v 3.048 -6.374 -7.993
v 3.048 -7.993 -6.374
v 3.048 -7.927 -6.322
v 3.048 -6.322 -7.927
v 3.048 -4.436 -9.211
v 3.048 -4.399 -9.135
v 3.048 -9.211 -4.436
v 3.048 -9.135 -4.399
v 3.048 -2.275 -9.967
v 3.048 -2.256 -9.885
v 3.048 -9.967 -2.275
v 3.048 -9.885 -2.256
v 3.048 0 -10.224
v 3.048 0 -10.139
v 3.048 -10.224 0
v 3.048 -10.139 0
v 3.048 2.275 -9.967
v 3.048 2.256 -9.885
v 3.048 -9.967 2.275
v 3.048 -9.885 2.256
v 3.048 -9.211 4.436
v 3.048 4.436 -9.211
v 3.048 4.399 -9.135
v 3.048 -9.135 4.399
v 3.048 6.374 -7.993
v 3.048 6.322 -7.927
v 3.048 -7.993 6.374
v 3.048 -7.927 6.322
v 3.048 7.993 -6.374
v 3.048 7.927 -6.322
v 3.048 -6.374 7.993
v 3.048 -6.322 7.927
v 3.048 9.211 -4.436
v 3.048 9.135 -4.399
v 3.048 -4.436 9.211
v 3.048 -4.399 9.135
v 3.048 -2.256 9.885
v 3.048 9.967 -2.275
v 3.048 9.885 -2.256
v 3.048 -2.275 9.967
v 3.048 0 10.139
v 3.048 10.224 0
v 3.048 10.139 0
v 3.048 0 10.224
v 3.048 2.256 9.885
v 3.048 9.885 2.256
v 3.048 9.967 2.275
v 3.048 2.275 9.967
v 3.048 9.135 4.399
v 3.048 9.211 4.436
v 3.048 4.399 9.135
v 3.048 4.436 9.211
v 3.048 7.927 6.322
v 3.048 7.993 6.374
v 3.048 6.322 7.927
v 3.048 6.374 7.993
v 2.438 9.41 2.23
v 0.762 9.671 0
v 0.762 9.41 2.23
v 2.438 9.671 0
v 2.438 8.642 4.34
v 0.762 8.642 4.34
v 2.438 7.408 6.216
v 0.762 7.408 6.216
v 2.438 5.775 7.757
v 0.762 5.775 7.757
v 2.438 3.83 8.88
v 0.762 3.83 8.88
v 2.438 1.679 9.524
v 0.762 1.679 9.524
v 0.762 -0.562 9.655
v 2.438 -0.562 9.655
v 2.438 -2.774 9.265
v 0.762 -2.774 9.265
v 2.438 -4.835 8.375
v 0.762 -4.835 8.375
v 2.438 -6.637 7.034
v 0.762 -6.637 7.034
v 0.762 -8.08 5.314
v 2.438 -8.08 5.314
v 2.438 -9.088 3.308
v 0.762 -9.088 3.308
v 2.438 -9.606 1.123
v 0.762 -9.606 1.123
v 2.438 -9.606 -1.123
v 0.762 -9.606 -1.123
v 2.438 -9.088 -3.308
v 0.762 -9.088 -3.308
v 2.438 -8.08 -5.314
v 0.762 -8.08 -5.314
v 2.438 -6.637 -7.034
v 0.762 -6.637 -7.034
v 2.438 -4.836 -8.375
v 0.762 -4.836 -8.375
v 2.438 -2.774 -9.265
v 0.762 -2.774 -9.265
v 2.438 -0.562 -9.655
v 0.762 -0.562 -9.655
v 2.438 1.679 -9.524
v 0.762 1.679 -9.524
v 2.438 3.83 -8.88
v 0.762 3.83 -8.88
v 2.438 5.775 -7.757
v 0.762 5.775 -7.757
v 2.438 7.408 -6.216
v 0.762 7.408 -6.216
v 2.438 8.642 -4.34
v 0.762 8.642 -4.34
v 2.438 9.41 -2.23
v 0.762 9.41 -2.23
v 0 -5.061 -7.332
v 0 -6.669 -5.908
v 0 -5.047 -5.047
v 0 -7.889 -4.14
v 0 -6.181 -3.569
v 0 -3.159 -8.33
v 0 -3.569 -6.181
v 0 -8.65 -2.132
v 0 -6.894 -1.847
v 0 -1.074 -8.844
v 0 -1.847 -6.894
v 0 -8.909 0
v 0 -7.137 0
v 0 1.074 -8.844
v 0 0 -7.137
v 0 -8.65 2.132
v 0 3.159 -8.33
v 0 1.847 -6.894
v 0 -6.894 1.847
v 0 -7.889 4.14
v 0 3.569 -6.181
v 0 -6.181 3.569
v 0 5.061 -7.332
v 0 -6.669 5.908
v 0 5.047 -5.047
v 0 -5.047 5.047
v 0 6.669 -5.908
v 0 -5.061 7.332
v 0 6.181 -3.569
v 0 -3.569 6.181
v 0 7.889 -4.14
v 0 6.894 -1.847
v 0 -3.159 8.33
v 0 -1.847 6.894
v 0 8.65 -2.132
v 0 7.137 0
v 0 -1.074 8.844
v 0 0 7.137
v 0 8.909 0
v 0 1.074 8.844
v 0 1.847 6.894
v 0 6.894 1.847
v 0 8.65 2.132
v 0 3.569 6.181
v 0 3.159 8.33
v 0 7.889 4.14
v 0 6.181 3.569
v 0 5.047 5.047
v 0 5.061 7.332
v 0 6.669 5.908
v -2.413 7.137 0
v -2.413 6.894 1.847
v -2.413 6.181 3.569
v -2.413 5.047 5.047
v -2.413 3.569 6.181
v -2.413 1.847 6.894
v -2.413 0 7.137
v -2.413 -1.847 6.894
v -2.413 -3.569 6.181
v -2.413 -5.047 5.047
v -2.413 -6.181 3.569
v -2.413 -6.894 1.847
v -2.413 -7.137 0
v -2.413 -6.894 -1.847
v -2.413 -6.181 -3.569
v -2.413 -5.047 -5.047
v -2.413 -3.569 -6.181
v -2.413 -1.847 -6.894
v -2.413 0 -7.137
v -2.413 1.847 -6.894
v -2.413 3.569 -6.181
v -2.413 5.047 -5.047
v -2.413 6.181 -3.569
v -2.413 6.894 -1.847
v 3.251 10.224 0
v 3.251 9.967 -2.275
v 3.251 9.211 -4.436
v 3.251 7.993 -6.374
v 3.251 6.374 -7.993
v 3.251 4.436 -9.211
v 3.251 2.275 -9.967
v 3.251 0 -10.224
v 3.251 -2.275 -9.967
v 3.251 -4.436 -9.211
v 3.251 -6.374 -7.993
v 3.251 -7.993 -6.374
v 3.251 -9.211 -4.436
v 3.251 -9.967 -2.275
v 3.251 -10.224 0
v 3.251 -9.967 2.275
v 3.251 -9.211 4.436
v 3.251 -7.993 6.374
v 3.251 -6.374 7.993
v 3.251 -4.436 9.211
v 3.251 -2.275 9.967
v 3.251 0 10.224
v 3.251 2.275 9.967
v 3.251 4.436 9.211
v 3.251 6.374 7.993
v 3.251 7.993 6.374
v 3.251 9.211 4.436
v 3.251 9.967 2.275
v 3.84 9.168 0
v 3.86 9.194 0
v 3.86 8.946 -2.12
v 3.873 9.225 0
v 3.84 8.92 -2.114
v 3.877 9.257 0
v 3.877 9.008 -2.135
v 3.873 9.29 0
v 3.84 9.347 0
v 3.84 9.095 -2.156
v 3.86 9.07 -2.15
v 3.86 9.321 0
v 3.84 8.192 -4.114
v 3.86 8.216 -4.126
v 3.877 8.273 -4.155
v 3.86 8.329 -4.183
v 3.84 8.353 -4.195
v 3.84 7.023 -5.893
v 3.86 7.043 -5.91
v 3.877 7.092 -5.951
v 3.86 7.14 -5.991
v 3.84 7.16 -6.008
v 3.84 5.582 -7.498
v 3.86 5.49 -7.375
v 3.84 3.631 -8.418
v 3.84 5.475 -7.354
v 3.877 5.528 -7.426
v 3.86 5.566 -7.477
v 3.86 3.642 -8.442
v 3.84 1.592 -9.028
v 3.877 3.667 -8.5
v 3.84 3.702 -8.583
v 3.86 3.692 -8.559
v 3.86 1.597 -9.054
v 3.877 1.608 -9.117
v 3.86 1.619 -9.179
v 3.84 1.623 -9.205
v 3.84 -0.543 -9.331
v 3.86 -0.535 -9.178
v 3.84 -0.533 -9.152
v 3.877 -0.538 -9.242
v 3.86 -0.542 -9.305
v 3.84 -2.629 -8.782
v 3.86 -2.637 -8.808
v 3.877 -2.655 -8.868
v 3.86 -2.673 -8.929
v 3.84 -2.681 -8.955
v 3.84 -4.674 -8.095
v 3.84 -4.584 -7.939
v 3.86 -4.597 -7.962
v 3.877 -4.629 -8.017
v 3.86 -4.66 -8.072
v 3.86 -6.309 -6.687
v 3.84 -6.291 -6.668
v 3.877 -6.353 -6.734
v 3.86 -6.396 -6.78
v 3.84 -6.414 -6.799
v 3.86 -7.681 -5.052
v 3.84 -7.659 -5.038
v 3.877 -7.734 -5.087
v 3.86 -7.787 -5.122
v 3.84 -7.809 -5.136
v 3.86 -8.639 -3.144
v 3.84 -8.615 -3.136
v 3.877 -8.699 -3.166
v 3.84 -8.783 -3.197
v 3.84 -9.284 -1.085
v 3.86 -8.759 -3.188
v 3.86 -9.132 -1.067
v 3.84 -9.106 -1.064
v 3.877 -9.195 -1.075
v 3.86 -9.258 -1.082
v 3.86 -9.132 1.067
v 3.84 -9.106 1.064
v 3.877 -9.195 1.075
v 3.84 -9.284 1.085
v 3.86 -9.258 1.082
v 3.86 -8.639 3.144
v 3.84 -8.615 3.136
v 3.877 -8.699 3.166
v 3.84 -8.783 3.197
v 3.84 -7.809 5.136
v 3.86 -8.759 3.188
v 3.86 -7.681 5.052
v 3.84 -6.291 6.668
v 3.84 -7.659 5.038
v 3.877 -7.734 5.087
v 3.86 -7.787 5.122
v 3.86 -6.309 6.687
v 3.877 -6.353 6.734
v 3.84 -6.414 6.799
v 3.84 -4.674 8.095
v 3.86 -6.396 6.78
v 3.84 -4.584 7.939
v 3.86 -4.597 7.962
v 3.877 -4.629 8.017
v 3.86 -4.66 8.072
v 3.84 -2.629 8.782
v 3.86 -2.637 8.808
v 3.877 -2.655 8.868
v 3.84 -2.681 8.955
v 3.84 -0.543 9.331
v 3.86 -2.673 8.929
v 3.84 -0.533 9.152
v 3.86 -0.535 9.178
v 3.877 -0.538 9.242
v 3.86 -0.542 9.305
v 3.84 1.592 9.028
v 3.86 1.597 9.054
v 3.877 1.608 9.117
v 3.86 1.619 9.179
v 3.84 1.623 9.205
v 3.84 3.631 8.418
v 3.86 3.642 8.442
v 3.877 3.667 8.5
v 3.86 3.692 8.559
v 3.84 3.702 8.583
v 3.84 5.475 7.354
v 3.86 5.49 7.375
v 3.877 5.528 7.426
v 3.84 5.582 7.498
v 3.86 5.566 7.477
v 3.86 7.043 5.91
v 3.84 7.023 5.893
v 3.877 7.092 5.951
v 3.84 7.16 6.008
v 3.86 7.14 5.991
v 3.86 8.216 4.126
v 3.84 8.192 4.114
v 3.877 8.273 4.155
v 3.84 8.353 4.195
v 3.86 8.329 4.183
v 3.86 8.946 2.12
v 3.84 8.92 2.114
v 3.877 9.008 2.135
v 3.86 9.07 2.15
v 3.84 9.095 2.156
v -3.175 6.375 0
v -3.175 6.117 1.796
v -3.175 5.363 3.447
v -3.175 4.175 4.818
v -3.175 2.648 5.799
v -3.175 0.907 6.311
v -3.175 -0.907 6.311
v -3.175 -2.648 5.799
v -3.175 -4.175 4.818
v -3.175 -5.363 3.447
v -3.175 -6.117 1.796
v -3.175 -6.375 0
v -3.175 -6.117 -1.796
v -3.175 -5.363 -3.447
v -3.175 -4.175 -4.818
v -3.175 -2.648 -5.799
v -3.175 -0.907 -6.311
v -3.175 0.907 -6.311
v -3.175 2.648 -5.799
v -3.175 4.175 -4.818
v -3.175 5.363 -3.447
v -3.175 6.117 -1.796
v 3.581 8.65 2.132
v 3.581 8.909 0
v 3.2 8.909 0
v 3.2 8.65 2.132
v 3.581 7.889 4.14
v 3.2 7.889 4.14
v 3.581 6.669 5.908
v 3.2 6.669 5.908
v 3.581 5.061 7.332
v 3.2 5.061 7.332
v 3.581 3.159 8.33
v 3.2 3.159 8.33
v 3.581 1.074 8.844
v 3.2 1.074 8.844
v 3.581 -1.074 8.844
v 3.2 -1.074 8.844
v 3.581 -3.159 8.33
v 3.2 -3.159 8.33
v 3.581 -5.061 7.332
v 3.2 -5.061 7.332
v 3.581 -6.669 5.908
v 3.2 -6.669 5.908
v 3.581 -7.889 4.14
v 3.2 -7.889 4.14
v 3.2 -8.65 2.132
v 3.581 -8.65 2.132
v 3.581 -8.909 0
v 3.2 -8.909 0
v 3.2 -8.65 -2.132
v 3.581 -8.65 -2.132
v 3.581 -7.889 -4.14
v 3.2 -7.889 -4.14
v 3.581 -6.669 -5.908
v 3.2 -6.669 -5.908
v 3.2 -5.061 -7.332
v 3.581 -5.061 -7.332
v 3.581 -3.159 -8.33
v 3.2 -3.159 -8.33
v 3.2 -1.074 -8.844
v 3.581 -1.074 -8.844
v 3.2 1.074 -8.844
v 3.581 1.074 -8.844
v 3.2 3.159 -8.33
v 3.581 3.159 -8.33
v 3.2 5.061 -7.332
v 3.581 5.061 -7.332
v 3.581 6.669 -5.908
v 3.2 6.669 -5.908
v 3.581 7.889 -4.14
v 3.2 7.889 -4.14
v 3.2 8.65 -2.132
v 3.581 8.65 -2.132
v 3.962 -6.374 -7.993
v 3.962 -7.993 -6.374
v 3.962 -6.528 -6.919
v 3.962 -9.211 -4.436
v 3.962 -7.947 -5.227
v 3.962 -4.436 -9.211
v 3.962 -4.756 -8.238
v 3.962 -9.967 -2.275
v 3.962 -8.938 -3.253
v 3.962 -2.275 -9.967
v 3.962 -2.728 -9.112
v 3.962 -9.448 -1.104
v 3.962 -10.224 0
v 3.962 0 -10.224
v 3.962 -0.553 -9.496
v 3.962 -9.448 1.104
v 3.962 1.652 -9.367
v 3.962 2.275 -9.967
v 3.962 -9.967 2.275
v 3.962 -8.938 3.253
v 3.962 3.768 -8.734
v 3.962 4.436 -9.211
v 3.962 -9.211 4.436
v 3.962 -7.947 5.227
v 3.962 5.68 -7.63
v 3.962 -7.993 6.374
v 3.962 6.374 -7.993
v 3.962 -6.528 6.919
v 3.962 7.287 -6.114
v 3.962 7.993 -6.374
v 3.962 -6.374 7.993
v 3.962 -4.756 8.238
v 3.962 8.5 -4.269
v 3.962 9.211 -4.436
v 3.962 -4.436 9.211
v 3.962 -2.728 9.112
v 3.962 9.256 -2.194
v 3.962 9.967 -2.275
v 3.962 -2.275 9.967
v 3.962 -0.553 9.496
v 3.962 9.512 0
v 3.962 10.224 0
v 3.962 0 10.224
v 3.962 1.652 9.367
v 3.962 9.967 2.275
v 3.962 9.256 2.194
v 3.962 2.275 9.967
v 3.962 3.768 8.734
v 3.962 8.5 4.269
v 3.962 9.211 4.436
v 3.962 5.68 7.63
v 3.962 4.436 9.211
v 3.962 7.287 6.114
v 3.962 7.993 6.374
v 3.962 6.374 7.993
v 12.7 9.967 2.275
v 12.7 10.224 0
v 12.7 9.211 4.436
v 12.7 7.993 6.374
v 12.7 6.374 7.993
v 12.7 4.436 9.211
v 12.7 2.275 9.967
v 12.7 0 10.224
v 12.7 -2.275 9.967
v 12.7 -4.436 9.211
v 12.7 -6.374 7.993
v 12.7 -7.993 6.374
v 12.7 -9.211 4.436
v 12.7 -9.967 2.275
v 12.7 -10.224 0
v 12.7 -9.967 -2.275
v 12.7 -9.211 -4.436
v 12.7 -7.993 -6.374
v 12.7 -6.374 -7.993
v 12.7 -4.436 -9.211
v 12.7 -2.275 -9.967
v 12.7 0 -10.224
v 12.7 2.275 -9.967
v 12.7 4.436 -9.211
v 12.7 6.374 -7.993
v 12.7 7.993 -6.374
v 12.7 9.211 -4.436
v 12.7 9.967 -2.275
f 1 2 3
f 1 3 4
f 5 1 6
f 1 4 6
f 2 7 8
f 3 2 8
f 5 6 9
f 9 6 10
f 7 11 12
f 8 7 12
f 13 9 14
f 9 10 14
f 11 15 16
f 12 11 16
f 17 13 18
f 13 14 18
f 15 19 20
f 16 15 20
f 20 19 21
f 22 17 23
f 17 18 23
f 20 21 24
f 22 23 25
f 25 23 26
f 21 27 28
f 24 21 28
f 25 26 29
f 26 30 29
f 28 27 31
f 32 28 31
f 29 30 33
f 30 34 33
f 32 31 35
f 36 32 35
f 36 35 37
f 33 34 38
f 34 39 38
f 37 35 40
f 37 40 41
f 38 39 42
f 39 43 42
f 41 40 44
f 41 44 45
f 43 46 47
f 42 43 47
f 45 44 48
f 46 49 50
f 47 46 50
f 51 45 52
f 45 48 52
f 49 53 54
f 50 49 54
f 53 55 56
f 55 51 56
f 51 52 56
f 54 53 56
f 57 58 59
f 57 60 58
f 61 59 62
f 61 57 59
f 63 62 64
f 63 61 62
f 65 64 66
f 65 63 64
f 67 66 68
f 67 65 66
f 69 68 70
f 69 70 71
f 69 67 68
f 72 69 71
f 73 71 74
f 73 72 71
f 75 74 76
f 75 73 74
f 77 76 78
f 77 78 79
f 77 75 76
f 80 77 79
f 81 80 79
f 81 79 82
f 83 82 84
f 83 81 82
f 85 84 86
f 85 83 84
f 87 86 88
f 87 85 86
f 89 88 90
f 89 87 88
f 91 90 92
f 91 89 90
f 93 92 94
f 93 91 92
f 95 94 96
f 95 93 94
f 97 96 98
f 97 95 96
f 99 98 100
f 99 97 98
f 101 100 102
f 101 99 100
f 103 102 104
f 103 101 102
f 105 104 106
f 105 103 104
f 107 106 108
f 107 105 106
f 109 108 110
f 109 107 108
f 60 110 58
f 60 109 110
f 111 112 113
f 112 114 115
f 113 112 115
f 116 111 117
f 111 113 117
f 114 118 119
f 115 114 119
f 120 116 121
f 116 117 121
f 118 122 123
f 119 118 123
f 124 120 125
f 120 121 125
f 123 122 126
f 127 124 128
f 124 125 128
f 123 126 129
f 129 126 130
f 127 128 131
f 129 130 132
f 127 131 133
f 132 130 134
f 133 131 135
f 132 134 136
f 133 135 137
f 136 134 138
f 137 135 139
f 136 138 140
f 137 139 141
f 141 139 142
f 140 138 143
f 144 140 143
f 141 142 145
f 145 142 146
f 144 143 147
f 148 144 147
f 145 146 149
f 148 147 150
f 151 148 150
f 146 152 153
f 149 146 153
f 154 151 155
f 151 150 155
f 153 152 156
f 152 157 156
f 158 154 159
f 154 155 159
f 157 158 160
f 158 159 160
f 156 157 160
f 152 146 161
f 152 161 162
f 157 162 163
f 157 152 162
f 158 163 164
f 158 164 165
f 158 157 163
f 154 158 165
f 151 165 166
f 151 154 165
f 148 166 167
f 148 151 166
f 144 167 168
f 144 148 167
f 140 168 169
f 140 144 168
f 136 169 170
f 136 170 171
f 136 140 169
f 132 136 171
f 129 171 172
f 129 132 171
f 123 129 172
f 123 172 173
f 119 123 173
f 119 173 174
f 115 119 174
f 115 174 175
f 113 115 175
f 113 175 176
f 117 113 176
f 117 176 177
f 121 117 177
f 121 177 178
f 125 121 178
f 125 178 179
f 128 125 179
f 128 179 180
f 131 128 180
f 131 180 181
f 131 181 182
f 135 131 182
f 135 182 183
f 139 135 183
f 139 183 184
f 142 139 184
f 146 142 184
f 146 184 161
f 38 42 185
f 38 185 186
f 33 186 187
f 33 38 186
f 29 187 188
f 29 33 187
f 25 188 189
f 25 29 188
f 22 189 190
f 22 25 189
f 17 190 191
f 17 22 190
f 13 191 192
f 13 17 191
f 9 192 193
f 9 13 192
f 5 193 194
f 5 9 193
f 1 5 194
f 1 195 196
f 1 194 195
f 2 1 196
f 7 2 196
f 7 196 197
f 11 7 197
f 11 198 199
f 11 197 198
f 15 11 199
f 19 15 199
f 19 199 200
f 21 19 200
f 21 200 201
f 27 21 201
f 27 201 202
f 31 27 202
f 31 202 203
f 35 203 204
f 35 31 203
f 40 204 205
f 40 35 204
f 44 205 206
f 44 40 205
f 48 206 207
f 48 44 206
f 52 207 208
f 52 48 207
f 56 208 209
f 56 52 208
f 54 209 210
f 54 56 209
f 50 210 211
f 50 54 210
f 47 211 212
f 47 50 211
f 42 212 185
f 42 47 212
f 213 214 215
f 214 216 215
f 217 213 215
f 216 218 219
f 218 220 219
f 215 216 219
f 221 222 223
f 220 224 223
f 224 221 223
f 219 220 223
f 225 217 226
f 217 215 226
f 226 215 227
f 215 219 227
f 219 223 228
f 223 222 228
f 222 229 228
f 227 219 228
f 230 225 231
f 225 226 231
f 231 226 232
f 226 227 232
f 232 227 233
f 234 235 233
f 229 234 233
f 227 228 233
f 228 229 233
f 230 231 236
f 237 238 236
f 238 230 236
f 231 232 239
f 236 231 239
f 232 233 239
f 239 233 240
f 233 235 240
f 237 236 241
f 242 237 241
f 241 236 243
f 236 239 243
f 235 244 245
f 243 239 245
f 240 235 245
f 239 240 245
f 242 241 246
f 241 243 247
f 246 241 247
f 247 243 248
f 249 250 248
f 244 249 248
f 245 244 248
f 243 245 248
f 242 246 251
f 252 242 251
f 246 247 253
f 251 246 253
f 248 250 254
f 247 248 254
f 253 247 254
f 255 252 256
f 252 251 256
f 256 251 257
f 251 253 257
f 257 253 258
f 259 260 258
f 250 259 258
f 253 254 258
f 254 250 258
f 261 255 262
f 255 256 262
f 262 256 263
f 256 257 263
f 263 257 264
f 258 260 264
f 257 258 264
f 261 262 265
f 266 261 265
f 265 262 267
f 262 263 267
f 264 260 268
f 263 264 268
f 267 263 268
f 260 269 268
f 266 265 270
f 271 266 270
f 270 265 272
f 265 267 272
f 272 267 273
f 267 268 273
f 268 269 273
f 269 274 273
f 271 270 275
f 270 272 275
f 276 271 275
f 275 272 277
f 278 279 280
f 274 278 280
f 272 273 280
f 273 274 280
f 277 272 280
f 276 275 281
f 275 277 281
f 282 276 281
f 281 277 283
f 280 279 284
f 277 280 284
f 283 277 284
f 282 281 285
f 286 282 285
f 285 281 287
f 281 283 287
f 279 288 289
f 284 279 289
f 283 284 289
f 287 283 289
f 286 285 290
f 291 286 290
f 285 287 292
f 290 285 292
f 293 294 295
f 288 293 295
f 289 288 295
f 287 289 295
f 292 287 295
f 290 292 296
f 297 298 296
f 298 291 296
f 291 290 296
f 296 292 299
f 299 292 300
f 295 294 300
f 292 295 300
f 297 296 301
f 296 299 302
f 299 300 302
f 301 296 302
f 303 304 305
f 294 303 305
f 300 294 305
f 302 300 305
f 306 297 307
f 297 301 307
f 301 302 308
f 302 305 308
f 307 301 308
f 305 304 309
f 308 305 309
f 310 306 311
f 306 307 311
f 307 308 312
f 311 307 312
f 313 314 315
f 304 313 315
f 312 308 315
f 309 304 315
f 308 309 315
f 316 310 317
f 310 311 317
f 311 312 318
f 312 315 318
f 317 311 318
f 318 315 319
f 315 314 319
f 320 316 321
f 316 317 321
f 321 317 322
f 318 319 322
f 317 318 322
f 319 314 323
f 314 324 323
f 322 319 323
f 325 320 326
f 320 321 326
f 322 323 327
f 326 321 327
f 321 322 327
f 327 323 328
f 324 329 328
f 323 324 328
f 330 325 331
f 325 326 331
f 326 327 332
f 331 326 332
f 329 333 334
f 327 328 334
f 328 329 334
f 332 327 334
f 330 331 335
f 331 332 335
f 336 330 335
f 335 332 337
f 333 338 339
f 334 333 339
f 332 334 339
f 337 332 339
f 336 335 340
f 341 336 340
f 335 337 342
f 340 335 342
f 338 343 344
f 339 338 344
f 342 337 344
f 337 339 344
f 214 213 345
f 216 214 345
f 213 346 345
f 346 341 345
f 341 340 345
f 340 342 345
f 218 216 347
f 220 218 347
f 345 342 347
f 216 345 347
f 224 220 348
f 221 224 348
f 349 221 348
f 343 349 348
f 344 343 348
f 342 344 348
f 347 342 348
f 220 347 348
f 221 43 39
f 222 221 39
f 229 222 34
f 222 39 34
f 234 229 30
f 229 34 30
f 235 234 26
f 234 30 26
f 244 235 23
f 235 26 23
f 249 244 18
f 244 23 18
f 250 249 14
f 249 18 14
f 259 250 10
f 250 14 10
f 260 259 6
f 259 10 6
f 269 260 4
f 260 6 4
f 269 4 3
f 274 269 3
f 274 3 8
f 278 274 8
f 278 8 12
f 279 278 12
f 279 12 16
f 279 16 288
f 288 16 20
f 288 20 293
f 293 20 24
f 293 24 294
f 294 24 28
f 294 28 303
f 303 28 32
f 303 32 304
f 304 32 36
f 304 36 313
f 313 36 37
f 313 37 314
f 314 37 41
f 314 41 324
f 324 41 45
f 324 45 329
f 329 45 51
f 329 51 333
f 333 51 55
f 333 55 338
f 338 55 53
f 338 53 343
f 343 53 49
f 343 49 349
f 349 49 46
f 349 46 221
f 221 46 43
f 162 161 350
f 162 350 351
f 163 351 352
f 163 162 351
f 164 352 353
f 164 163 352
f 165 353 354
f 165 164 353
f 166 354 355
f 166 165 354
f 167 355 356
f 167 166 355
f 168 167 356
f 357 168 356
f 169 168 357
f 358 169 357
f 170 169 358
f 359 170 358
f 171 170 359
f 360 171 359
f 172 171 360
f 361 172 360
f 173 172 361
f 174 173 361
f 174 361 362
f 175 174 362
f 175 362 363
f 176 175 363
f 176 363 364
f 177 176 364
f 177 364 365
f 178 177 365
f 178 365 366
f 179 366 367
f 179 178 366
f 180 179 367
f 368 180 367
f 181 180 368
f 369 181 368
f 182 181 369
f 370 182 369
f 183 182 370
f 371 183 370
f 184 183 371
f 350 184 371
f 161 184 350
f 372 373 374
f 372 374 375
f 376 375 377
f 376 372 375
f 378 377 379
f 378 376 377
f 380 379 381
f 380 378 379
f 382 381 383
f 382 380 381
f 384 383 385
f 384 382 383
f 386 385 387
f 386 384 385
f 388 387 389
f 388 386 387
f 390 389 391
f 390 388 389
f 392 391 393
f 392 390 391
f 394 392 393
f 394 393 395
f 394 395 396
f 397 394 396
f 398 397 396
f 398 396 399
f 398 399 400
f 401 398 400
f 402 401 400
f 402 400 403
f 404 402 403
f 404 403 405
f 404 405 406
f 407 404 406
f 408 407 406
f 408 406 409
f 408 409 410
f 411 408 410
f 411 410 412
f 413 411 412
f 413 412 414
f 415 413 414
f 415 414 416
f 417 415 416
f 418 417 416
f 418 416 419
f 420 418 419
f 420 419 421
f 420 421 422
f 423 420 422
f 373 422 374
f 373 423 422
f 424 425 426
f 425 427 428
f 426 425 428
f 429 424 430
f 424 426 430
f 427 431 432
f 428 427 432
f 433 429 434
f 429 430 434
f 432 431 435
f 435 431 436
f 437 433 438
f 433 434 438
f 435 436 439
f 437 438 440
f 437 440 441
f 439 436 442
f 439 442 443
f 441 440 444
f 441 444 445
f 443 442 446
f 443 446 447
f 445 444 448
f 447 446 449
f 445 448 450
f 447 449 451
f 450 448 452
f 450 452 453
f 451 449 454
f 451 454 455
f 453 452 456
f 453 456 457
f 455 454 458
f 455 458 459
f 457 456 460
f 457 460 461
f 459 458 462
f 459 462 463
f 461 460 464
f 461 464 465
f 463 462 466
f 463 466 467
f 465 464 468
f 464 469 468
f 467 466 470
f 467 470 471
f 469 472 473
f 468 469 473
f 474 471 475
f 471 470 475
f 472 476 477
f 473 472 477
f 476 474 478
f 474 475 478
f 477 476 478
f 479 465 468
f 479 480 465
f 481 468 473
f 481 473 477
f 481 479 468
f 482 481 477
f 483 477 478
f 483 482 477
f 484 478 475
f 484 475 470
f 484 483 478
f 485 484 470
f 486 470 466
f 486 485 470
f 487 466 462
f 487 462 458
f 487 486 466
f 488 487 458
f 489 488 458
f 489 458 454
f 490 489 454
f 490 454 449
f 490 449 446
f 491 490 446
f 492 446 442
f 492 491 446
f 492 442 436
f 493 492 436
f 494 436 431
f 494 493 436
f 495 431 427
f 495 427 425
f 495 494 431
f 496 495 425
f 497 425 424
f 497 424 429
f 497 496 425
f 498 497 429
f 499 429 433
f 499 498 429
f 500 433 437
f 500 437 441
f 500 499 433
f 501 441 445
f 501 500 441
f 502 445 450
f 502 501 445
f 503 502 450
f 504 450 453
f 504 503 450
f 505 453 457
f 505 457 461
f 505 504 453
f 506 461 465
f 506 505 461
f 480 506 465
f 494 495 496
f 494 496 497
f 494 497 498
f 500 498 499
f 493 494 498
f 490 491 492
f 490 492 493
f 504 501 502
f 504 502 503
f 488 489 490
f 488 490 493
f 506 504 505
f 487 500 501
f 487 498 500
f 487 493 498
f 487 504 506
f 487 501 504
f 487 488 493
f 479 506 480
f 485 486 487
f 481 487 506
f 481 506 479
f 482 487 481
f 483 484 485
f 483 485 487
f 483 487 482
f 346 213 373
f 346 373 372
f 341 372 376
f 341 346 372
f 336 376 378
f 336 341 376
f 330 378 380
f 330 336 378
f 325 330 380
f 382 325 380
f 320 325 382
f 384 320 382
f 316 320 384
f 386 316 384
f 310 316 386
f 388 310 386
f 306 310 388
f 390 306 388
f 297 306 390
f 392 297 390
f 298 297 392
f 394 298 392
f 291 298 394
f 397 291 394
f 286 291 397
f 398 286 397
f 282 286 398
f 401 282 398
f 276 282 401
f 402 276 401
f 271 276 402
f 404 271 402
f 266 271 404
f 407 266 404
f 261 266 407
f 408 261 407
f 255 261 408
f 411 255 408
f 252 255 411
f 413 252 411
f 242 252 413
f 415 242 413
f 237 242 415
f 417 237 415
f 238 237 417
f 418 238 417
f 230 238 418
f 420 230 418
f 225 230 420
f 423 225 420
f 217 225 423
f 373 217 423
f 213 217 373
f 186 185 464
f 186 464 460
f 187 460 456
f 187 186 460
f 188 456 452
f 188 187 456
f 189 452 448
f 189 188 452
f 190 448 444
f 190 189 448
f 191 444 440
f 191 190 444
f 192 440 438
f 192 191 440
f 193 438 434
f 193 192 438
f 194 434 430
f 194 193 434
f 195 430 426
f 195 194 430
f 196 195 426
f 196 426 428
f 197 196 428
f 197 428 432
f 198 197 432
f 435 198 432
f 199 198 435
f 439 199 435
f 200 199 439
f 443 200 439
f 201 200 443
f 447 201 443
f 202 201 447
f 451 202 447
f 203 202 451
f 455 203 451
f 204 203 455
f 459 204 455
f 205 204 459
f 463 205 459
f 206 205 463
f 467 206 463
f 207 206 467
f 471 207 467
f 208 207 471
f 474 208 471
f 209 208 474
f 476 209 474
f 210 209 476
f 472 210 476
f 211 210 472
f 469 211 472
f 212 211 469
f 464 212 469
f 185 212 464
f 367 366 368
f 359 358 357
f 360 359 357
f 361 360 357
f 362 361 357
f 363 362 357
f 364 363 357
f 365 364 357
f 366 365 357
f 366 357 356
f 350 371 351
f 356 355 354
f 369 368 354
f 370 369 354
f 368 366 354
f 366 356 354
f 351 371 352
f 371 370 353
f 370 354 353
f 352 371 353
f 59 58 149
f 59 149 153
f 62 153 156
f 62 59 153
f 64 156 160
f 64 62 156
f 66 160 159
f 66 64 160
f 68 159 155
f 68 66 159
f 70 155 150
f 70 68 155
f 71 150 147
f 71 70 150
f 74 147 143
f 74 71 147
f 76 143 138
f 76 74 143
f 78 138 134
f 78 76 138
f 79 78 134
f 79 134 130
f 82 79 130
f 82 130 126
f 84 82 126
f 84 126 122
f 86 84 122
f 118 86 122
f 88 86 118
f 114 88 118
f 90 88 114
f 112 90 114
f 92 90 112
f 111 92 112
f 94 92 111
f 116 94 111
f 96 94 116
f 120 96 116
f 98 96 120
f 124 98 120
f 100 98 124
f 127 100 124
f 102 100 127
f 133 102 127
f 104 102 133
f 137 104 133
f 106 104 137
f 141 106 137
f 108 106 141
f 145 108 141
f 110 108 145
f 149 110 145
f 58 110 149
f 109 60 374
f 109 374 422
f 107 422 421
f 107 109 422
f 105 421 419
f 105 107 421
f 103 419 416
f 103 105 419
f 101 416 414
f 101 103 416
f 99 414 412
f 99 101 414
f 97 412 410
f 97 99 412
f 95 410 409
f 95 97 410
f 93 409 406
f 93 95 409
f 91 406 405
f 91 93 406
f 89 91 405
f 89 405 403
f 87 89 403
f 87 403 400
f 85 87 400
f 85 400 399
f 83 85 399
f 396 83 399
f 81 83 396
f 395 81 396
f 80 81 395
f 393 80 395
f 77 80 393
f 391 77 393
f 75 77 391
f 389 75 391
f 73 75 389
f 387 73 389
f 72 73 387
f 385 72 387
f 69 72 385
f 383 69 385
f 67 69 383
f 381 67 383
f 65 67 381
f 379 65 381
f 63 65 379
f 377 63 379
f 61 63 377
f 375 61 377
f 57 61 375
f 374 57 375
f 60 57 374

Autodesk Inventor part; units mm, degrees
sketch "Sketch_1" plane through (0, 0, 0) normal (0, 0, 1) x (1, 0, 0)
  line L0 (12.7, 0) -> (0, 0)
  line L1 (0, 0) -> (0, 8.9091)
  line L2 (0, 8.9091) -> (0.762, 9.671)
  line L3 (0.762, 9.671) -> (2.4384, 9.671)
  line L4 (2.4384, 9.671) -> (3.2004, 8.9091)
  line L5 (3.2004, 8.9091) -> (3.9624, 8.9091)
  line L6 (3.9624, 8.9091) -> (3.9624, 10.2235)
  line L7 (3.9624, 10.2235) -> (12.7, 10.2235)
  line L8 (12.7, 10.2235) -> (12.7, 0)
  line L9 (12.7, 0) -> (0, 0)
revolve "Revolution1" add sketch "Sketch_1" angle 360 about axis through (12.7, 0, 0) along (1, 0, 0)
sketch "Sketch_24" plane through (0, 0, 0) normal (0, 0, 1) x (1, 0, 0)
  line L0 (3.9624, 0) -> (3.2004, 0)
  line L1 (3.0477, 10.2235) -> (3.0477, 10.1393)
  line L2 (3.0477, 10.1393) -> (3.8399, 9.3472)
  arc A0 (3.8399, 9.1676) -> (3.8399, 9.3472) centre (3.7501, 9.2574) ccw
  line L3 (3.8399, 9.1676) -> (3.5814, 8.9091)
  line L4 (3.5814, 8.9091) -> (3.2004, 8.9091)
  line L5 (3.2004, 8.9091) -> (3.2004, 8.655)
  line L6 (3.2004, 8.655) -> (3.9624, 8.655)
  line L7 (3.9624, 8.655) -> (3.9624, 9.512)
  line L8 (3.9624, 9.512) -> (3.2509, 10.2235)
  line L9 (3.2509, 10.2235) -> (3.0477, 10.2235)
revolve "Revolution2" add sketch "Sketch_24" angle 360 about axis through (3.9624, 0, 0) along (1, 0, 0)
sketch "Sketch_26" plane through (0, 0, 0) normal (0, 0, 1) x (1, 0, 0)
  line L0 (0, 0) -> (-3.175, 0)
  line L1 (-3.175, 0) -> (-3.175, 6.3754)
  line L2 (-3.175, 6.3754) -> (-2.413, 7.1374)
  line L3 (-2.413, 7.1374) -> (0, 7.1374)
  line L4 (0, 7.1374) -> (0, 0)
  line L5 (0, 0) -> (-3.175, 0)
revolve "Revolution3" add sketch "Sketch_26" angle 360 about axis through (0, 0, 0) along (1, 0, 0)
ref_plane "lovra_XY" through (12.7, 0, 0) normal (1, 0, 0) x (0, 1, 0)
ref_plane "lovra_YZ" through (12.7, 0, 0) normal (0, 1, 0) x (0, 0, 1)
ref_plane "lovra_ZX" through (12.7, 0, 0) normal (0, 0, 1) x (1, 0, 0)
ref_plane "lovra1_XY" through (7.9248, 0, 0) normal (1, 0, 0) x (0, 0, -1)
ref_plane "lovra1_YZ" through (7.9248, 0, 0) normal (0, 0, -1) x (0, 1, 0)
ref_plane "lovra1_ZX" through (7.9248, 0, 0) normal (0, 1, 0) x (1, 0, 0)
ref_plane "lovra2_XY" through (7.9248, 7.874, 0) normal (1, 0, 0) x (0, 0, -1)
ref_plane "lovra2_YZ" through (7.9248, 7.874, 0) normal (0, 0, -1) x (0, 1, 0)
ref_plane "lovra2_ZX" through (7.9248, 7.874, 0) normal (0, 1, 0) x (1, 0, 0)
ref_plane "lovra21_XY" through (0, 0, 5.2705) normal (1, 0, 0) x (0, 0, -1)
ref_plane "lovra21_YZ" through (0, 0, 5.2705) normal (0, 0, -1) x (0, 1, 0)
ref_plane "lovra21_ZX" through (0, 0, 5.2705) normal (0, 1, 0) x (1, 0, 0)
ref_plane "lovra22_XY" through (0, 0, -5.2705) normal (1, 0, 0) x (0, 0, -1)
ref_plane "lovra22_YZ" through (0, 0, -5.2705) normal (0, 0, -1) x (0, 1, 0)
ref_plane "lovra22_ZX" through (0, 0, -5.2705) normal (0, 1, 0) x (1, 0, 0)
ref_plane "lovra3_XY" through (7.9248, -7.874, 0) normal (1, 0, 0) x (0, 0, -1)
ref_plane "lovra3_YZ" through (7.9248, -7.874, 0) normal (0, 0, -1) x (0, 1, 0)
ref_plane "lovra3_ZX" through (7.9248, -7.874, 0) normal (0, 1, 0) x (1, 0, 0)
ref_plane "olen_XY" through (12.7, 0, 0) normal (1, 0, 0) x (0, 0, -1)
ref_plane "olen_YZ" through (12.7, 0, 0) normal (0, 0, -1) x (0, 1, 0)
ref_plane "olen_ZX" through (12.7, 0, 0) normal (0, 1, 0) x (1, 0, 0)
ref_plane "to_mounting_bracket_XY" through (23.0124, 0, 0) normal (1, 0, 0) x (0, 0, -1)
ref_plane "to_mounting_bracket_YZ" through (23.0124, 0, 0) normal (0, 0, -1) x (0, 1, 0)
ref_plane "to_mounting_bracket_ZX" through (23.0124, 0, 0) normal (0, 1, 0) x (1, 0, 0)
ref_plane "to_nut_XY" through (0, 0, 0) normal (1, 0, 0) x (0, 0, -1)
ref_plane "to_nut_YZ" through (0, 0, 0) normal (0, 0, -1) x (0, 1, 0)
ref_plane "to_nut_ZX" through (0, 0, 0) normal (0, 1, 0) x (1, 0, 0)
ref_plane "to_pin_XY" through (33.3248, 0, 0) normal (0, 0, 1) x (1, 0, 0)
ref_plane "to_pin_YZ" through (33.3248, 0, 0) normal (1, 0, 0) x (0, 1, 0)
ref_plane "to_pin_ZX" through (33.3248, 0, 0) normal (0, 1, 0) x (0, 0, 1)
ref_plane "to_screw_XY" through (17.4752, 2.032, -6.0452) normal (0, 1, 0) x (1, 0, 0)
ref_plane "to_screw_YZ" through (17.4752, 2.032, -6.0452) normal (1, 0, 0) x (0, 0, -1)
ref_plane "to_screw_ZX" through (17.4752, 2.032, -6.0452) normal (0, 0, -1) x (0, 1, 0)
ref_plane "to_tube_XY" through (3.2004, 0, 0) normal (1, 0, 0) x (0, 0, -1)
ref_plane "to_tube_YZ" through (3.2004, 0, 0) normal (0, 0, -1) x (0, 1, 0)
ref_plane "to_tube_ZX" through (3.2004, 0, 0) normal (0, 1, 0) x (1, 0, 0)
properties part number "04R0000_rear_head"
